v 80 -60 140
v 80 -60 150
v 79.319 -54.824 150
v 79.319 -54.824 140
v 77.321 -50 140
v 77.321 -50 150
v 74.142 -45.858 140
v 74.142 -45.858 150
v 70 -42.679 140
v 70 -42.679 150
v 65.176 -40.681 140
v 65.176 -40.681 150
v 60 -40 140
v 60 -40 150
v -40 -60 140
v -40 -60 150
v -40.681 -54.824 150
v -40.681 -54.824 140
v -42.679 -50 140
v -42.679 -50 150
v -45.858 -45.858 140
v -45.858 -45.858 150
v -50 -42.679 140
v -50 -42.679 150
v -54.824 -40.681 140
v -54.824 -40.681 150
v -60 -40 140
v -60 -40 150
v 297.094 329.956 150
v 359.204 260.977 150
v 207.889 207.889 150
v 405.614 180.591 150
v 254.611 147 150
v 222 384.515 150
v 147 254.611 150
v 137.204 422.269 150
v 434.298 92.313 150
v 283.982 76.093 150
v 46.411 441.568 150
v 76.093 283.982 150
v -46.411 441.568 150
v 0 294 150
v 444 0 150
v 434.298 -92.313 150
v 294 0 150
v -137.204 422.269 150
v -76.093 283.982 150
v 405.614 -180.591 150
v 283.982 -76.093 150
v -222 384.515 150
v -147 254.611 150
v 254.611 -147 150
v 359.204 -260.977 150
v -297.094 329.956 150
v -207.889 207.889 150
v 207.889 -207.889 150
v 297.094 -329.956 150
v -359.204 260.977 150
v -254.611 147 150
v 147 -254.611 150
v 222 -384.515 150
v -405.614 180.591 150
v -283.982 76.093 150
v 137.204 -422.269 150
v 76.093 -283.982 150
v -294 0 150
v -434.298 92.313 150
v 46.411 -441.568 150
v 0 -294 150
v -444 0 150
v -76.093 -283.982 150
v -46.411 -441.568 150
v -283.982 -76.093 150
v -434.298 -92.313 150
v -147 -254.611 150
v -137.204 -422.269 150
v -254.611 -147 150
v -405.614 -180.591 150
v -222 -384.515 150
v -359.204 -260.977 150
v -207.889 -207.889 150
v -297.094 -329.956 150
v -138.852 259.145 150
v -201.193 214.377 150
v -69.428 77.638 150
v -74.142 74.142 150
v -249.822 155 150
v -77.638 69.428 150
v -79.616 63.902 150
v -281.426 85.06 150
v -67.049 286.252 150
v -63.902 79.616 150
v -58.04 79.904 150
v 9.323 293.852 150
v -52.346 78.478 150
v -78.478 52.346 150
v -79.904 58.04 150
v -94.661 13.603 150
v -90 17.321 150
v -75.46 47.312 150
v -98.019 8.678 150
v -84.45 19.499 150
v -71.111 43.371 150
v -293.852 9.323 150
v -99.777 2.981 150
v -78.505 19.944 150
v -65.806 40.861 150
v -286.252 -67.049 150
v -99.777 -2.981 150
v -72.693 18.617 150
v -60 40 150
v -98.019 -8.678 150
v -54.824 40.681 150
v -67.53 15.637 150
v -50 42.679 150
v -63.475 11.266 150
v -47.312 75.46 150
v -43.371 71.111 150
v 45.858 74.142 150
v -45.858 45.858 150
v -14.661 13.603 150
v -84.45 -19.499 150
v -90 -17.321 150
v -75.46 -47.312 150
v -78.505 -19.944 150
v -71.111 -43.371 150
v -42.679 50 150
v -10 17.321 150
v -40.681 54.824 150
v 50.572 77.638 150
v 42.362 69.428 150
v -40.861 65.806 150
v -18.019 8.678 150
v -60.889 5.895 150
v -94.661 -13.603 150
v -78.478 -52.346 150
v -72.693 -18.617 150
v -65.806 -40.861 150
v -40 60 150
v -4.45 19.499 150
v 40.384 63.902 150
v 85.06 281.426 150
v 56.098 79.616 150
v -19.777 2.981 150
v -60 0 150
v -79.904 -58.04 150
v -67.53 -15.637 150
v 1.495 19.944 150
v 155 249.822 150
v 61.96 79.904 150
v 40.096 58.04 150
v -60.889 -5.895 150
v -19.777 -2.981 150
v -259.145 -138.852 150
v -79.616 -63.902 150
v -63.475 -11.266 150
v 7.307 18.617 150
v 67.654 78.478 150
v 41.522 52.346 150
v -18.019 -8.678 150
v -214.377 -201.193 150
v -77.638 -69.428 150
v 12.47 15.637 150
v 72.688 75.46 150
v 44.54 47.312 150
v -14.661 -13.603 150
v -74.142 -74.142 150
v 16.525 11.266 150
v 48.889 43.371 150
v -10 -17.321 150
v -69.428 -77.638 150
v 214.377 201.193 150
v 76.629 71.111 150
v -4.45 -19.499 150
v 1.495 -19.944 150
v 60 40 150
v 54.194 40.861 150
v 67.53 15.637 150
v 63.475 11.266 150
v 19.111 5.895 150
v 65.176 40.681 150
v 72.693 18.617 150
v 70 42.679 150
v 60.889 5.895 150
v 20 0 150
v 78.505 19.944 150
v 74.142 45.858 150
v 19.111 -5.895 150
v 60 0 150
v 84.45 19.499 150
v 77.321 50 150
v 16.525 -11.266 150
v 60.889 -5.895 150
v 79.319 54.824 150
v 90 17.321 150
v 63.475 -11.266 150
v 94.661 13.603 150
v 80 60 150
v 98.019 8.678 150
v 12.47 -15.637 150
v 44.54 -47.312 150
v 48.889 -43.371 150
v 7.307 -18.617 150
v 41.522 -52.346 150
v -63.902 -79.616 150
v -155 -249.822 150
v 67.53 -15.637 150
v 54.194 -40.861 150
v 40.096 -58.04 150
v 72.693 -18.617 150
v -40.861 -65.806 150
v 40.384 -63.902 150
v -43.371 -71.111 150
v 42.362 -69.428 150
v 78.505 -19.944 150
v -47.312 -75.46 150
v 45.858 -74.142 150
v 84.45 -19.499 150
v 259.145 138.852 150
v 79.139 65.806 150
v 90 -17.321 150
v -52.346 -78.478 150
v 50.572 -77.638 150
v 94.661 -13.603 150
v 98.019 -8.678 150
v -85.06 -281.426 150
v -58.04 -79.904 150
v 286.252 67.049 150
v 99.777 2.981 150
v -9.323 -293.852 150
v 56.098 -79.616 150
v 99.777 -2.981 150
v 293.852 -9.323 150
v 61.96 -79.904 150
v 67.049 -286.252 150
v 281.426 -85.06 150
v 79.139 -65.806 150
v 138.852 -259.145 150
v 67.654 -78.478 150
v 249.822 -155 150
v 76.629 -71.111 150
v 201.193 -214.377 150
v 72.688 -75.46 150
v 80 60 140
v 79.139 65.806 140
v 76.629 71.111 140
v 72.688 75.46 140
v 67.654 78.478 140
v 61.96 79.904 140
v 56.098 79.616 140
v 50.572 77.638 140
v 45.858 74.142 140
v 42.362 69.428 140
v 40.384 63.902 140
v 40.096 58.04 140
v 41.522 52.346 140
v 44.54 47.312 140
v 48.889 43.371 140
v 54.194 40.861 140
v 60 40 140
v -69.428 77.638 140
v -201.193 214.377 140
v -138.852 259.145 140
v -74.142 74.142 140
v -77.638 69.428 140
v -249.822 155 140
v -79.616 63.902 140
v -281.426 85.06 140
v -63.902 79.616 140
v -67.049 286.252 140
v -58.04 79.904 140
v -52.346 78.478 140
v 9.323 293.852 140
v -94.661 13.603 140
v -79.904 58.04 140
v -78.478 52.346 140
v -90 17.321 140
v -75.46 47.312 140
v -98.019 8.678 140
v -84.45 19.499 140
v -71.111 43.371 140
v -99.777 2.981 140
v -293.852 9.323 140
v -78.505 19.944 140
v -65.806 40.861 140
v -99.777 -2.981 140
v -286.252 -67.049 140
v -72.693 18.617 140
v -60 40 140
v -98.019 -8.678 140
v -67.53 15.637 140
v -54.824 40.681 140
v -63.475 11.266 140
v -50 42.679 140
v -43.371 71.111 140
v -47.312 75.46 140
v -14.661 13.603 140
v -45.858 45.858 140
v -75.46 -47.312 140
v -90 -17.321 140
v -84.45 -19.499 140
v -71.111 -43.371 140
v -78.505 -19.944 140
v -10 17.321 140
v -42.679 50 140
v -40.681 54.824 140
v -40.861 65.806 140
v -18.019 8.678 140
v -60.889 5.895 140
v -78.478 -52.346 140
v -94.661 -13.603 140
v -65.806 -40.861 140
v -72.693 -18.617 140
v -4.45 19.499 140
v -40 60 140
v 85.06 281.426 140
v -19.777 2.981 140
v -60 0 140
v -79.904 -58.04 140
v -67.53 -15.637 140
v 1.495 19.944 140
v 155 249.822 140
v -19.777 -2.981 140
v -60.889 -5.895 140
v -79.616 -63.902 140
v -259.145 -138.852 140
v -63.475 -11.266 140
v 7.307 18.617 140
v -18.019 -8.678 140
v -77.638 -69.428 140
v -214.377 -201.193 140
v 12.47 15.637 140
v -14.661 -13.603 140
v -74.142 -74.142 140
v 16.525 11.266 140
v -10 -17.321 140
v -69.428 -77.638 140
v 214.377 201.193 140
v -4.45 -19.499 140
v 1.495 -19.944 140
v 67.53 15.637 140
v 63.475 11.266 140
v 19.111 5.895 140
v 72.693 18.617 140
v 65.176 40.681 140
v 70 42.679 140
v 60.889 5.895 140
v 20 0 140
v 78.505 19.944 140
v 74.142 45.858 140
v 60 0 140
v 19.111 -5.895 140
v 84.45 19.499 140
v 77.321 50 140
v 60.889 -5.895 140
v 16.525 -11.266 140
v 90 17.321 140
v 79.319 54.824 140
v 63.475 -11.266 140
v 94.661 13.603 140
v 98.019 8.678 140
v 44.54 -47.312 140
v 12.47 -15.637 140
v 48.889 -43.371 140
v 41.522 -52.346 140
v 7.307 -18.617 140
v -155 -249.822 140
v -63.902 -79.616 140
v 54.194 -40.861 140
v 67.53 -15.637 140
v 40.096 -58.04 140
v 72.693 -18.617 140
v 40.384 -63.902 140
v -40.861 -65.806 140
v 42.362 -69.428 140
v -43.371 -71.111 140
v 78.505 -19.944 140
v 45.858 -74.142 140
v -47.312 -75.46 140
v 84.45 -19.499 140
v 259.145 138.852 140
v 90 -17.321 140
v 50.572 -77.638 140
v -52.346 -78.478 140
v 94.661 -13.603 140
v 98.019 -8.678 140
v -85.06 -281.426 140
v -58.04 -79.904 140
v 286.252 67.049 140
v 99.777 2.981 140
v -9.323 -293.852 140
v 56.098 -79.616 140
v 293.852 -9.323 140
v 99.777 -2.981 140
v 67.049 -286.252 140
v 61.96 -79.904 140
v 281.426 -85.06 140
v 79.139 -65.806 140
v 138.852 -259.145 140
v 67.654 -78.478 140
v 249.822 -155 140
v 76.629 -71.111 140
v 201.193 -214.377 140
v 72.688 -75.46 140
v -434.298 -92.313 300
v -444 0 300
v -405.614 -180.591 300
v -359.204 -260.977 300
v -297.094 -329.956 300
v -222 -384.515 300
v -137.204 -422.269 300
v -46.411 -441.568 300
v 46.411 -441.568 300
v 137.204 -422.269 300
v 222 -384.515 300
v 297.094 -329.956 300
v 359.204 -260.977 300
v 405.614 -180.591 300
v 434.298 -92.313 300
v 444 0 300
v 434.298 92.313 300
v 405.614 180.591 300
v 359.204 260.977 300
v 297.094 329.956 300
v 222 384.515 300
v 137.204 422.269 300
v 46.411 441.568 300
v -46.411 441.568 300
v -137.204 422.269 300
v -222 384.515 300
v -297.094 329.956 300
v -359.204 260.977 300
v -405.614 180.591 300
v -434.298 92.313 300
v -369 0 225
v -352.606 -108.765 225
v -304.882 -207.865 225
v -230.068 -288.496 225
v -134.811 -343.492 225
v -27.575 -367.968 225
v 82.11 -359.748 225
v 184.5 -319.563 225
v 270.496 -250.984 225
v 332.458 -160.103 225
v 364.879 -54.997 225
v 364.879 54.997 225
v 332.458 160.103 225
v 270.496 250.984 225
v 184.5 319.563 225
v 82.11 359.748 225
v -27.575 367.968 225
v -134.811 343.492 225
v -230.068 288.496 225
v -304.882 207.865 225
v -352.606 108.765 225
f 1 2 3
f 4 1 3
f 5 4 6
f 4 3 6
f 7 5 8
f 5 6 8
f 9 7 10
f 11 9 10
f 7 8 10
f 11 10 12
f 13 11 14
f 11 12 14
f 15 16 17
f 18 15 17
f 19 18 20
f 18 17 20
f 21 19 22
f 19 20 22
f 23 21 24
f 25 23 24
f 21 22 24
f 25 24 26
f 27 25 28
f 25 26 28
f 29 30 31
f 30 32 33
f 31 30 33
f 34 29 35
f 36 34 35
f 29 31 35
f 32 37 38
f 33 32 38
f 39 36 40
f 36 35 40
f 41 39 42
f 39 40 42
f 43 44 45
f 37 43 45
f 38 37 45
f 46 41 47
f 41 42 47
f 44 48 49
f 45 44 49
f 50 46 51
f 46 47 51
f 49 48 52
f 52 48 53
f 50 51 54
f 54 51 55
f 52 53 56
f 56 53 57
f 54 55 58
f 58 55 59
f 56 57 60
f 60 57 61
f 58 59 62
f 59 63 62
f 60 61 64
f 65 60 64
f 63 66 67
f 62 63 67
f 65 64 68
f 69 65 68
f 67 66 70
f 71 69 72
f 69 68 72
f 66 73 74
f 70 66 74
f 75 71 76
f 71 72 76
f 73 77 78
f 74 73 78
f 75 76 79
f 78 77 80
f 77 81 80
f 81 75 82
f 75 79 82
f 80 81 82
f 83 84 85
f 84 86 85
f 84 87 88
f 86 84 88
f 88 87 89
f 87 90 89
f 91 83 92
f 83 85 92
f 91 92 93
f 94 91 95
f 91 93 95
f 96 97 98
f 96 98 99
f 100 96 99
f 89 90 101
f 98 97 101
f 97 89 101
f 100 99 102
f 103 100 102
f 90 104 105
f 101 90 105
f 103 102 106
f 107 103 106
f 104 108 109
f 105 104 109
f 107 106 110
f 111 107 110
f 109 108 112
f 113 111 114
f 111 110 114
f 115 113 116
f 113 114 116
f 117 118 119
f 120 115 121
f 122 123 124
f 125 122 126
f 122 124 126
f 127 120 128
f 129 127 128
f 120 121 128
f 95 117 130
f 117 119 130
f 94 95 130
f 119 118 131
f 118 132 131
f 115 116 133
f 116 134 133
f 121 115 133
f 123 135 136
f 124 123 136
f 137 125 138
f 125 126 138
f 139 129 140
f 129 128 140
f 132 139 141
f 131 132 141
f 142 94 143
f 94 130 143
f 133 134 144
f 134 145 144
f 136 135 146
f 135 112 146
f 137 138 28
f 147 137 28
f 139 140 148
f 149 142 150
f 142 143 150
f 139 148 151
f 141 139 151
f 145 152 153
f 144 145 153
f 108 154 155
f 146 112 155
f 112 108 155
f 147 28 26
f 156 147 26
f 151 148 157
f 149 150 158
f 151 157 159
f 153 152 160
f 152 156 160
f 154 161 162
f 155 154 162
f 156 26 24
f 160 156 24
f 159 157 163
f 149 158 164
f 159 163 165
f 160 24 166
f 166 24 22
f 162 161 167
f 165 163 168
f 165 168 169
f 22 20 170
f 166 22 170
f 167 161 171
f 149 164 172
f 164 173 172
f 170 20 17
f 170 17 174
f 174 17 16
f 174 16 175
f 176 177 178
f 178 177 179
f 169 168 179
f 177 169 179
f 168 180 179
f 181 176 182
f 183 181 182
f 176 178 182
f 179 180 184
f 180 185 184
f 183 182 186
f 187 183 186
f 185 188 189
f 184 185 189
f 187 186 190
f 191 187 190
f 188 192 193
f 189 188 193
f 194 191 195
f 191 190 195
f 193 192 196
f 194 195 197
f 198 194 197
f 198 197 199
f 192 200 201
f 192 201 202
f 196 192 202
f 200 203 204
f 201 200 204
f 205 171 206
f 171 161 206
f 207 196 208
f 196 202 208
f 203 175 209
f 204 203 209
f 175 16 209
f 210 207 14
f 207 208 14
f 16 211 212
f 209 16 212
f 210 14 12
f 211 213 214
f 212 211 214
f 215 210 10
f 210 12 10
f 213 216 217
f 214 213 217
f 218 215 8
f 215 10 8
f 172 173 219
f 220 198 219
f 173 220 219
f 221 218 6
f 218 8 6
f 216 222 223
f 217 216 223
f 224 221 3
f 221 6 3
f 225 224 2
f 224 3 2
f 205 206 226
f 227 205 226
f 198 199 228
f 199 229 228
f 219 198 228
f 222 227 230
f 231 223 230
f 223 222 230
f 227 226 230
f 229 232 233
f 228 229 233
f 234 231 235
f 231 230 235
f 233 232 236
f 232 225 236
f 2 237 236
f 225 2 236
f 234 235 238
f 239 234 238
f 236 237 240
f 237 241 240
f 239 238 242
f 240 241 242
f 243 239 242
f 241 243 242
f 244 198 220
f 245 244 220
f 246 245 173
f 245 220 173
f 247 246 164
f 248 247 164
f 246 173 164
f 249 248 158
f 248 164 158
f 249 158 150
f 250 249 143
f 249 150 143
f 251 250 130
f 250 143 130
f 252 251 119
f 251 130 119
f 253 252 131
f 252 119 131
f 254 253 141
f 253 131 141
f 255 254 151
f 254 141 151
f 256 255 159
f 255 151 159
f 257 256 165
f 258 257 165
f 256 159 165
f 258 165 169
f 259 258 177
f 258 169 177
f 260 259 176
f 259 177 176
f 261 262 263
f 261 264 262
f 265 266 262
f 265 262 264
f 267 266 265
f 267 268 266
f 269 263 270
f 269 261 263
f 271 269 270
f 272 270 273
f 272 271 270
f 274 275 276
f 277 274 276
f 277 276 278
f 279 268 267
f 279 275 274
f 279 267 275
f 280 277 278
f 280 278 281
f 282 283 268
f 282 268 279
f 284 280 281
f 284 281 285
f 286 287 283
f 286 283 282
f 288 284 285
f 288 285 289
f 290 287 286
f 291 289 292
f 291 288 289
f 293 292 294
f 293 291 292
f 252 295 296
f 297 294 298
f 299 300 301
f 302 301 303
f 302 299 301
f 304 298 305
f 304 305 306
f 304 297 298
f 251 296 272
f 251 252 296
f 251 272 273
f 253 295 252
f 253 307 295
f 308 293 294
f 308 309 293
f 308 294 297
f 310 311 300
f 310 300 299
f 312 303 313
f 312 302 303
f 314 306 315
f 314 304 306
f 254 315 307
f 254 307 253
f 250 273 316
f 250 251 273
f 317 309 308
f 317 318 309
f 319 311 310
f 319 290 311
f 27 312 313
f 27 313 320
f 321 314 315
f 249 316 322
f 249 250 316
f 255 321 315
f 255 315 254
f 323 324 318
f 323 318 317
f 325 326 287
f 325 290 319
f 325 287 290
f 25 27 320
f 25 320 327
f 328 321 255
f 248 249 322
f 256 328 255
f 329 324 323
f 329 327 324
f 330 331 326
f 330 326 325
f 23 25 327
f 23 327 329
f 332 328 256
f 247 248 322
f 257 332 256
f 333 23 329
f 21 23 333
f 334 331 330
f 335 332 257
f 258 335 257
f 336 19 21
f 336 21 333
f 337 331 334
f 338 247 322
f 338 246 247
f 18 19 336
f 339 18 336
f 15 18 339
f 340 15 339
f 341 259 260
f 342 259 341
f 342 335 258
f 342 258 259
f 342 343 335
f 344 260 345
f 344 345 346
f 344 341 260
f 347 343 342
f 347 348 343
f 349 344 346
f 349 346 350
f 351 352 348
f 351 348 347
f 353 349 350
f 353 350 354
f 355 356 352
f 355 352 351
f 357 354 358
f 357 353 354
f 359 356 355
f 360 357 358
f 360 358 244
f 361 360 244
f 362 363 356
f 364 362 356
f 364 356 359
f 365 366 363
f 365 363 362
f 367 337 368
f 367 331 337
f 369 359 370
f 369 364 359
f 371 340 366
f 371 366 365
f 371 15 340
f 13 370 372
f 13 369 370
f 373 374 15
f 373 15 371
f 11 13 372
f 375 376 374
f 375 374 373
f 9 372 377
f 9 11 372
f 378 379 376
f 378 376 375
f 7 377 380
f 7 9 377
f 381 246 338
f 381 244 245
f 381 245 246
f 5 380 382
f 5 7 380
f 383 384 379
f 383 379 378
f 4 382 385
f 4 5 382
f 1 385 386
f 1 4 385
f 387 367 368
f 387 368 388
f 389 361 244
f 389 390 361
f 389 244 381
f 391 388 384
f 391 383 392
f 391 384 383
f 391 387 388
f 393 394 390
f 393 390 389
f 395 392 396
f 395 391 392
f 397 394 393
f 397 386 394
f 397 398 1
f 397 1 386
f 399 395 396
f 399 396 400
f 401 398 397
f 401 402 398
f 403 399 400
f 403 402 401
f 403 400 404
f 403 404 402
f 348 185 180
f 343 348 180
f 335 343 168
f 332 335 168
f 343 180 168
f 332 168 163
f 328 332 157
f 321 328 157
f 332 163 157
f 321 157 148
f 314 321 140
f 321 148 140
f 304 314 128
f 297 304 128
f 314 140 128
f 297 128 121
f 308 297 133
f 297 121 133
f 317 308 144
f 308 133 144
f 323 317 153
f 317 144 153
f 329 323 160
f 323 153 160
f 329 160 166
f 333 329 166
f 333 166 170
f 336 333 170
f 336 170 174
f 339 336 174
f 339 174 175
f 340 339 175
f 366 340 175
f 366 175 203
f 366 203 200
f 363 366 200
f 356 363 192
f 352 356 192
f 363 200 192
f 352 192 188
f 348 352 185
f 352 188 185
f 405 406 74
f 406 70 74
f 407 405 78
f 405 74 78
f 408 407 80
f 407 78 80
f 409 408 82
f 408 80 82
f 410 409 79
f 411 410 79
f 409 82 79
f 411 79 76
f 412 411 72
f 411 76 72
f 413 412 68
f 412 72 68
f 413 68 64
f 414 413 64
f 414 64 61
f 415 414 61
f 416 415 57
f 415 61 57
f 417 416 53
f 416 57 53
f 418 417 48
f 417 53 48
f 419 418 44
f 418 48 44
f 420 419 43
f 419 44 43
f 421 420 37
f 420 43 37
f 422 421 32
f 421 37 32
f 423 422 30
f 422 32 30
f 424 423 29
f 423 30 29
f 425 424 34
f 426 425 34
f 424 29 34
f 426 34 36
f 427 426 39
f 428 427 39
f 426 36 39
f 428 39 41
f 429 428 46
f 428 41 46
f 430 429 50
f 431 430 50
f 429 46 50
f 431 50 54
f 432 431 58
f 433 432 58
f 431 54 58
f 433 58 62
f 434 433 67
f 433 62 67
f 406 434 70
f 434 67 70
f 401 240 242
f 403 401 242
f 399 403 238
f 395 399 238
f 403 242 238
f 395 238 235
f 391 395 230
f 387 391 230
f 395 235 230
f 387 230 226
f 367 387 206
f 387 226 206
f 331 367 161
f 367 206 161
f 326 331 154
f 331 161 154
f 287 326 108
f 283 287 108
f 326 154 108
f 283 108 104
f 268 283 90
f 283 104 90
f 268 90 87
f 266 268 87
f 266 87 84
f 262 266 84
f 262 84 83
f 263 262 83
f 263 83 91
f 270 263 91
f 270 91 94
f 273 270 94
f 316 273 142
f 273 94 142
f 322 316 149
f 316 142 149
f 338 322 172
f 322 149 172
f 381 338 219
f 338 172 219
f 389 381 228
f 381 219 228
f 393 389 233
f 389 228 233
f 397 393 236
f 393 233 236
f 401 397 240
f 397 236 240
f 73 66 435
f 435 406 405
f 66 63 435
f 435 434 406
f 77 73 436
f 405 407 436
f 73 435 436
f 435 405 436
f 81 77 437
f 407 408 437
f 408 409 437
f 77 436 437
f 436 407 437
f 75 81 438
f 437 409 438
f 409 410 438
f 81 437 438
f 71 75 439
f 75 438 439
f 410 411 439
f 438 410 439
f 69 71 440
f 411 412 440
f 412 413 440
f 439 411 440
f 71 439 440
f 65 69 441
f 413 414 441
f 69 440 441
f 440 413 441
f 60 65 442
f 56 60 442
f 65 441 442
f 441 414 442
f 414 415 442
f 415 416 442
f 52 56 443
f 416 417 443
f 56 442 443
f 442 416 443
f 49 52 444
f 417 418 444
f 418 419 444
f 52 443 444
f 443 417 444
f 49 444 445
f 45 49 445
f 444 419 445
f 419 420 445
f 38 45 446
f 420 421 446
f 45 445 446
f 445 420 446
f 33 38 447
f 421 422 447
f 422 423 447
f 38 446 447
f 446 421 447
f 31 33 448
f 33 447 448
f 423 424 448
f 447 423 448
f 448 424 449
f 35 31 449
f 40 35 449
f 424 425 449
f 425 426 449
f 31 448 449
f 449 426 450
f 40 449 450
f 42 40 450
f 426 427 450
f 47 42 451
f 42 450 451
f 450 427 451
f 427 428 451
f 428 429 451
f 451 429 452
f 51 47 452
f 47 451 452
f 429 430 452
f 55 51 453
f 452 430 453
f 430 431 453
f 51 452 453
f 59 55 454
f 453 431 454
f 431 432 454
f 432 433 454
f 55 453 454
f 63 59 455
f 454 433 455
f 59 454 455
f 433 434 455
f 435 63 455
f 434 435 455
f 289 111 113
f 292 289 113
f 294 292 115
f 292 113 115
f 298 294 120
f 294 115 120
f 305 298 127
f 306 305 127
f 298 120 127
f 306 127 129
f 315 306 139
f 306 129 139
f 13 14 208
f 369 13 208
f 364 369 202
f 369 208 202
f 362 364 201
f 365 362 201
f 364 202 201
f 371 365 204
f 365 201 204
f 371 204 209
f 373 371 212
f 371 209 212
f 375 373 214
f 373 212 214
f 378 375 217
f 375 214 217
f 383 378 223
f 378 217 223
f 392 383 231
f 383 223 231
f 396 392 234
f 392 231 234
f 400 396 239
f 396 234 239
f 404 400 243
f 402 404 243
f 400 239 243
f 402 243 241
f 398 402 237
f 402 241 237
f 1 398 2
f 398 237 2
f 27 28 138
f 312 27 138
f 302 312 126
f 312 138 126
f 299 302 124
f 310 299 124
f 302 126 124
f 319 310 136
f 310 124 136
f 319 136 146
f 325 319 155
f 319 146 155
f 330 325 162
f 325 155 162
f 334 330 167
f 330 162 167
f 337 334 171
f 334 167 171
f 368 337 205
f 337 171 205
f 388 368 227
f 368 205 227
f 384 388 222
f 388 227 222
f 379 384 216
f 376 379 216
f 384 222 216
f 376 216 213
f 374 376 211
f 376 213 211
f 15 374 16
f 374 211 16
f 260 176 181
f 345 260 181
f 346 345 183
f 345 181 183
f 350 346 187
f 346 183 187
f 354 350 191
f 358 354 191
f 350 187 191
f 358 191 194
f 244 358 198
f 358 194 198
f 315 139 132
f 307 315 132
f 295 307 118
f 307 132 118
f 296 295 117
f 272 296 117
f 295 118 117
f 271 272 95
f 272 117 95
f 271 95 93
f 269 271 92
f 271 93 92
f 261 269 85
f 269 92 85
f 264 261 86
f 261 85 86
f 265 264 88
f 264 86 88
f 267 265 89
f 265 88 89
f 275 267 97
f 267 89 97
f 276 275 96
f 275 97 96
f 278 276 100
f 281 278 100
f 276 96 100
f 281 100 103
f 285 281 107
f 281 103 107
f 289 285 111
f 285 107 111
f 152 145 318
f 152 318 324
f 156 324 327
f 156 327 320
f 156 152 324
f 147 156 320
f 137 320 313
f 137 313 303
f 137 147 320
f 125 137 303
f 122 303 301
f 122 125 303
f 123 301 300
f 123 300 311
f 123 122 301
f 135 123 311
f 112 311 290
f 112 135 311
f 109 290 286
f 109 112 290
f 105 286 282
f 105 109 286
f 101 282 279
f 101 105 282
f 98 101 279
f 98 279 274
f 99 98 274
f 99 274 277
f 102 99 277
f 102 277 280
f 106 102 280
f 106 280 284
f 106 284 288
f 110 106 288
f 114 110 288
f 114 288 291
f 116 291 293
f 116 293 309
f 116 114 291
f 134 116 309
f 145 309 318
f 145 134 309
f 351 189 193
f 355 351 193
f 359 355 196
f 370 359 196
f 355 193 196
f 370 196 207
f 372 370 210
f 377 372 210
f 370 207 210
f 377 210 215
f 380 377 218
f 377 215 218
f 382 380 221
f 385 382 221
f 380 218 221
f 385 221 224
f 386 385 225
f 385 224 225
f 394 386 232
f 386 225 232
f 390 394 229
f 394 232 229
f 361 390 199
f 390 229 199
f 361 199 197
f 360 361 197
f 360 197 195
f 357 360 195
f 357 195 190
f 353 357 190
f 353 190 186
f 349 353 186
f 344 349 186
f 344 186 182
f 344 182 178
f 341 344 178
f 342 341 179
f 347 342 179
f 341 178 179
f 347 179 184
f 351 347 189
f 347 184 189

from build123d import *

# Parameters (mm, degrees)
F2_R     = 20
F5_DEPTH = 10


# Not quite as in the source:
# - the program builds the solid bodies; features that only make, move or delete a surface that nothing else refers to are left out


with BuildPart() as f1:
    # F0 (on Front) → F1 (revolve)
    with BuildSketch(Plane.XZ):
        Polygon((-444, 300), (-444, 150), (-294, 150), align=None)
    revolve(axis=Axis((0, 0, 272.4012136459), (0, 0, 1)))


with BuildPart() as f5:
    # F2 (on face) → F5 (new body)
    with BuildSketch(Plane(origin=(0, 0, 150), x_dir=(1, 0, 0), z_dir=(0, 0, -1))):
        Polygon((249.8219365868, 155), (0, 155), (-249.8219365868, 155), (0, -294), align=None)
        Polygon((-203.0846477822, 125), (0, 125), (203.0846477822, 125), (0, -240), align=None, mode=Mode.SUBTRACT)
        Polygon((203.0846477822, 125), (0, 125), (-203.0846477822, 125), (0, -240), align=None)
        with BuildLine():
            ThreePointArc((-40, -60), (-74.1421356237, -74.1421356237), (-60, -40))
            ThreePointArc((-60, -40), (-45.8578643763, -45.8578643763), (-40, -60))
        make_face(mode=Mode.SUBTRACT)
        with BuildLine():
            ThreePointArc((80, -60), (45.8578643763, -74.1421356237), (60, -40))
            ThreePointArc((60, -40), (74.1421356237, -45.8578643763), (80, -60))
        make_face(mode=Mode.SUBTRACT)
        with Locations((-80, 0)):
            Circle(F2_R, mode=Mode.SUBTRACT)
        with BuildLine():
            ThreePointArc((-40, 60), (-45.8578643763, 45.8578643763), (-60, 40))
            ThreePointArc((-60, 40), (-74.1421356237, 74.1421356237), (-40, 60))
        make_face(mode=Mode.SUBTRACT)
        with BuildLine():
            ThreePointArc((-20, 0), (0, 20), (20, 0))
            ThreePointArc((20, 0), (0, -20), (-20, 0))
        make_face(mode=Mode.SUBTRACT)
        with BuildLine():
            ThreePointArc((100, 0), (79.9999999661, -20), (60, 6.79e-08))
            ThreePointArc((60, 6.79e-08), (80.0000000339, 20), (100, 0))
        make_face(mode=Mode.SUBTRACT)
        with BuildLine():
            ThreePointArc((80, 60), (74.1421356237, 45.8578643763), (60, 40))
            ThreePointArc((60, 40), (45.8578643763, 74.1421356237), (80, 60))
        make_face(mode=Mode.SUBTRACT)
        with BuildLine():
            Line((0, -294), (-249.8219365868, 155))
            ThreePointArc((-249.8219365868, 155), (-256.910490249, -142.9440449966), (0, -294))
        make_face()
        with BuildLine():
            ThreePointArc((294, 0), (282.7398533604, 80.5864462657), (249.8219365868, 155))
            Line((249.8219365868, 155), (0, -294))
            ThreePointArc((0, -294), (207.8893936688, -207.8893936688), (294, 0))
        make_face()
        with BuildLine():
            Line((-249.8219365868, 155), (0, 155))
            Line((0, 155), (249.8219365868, 155))
            ThreePointArc((249.8219365868, 155), (0, 294), (-249.8219365868, 155))
        make_face()
    extrude(amount=F5_DEPTH)


solid = Compound([f1.part, f5.part])
